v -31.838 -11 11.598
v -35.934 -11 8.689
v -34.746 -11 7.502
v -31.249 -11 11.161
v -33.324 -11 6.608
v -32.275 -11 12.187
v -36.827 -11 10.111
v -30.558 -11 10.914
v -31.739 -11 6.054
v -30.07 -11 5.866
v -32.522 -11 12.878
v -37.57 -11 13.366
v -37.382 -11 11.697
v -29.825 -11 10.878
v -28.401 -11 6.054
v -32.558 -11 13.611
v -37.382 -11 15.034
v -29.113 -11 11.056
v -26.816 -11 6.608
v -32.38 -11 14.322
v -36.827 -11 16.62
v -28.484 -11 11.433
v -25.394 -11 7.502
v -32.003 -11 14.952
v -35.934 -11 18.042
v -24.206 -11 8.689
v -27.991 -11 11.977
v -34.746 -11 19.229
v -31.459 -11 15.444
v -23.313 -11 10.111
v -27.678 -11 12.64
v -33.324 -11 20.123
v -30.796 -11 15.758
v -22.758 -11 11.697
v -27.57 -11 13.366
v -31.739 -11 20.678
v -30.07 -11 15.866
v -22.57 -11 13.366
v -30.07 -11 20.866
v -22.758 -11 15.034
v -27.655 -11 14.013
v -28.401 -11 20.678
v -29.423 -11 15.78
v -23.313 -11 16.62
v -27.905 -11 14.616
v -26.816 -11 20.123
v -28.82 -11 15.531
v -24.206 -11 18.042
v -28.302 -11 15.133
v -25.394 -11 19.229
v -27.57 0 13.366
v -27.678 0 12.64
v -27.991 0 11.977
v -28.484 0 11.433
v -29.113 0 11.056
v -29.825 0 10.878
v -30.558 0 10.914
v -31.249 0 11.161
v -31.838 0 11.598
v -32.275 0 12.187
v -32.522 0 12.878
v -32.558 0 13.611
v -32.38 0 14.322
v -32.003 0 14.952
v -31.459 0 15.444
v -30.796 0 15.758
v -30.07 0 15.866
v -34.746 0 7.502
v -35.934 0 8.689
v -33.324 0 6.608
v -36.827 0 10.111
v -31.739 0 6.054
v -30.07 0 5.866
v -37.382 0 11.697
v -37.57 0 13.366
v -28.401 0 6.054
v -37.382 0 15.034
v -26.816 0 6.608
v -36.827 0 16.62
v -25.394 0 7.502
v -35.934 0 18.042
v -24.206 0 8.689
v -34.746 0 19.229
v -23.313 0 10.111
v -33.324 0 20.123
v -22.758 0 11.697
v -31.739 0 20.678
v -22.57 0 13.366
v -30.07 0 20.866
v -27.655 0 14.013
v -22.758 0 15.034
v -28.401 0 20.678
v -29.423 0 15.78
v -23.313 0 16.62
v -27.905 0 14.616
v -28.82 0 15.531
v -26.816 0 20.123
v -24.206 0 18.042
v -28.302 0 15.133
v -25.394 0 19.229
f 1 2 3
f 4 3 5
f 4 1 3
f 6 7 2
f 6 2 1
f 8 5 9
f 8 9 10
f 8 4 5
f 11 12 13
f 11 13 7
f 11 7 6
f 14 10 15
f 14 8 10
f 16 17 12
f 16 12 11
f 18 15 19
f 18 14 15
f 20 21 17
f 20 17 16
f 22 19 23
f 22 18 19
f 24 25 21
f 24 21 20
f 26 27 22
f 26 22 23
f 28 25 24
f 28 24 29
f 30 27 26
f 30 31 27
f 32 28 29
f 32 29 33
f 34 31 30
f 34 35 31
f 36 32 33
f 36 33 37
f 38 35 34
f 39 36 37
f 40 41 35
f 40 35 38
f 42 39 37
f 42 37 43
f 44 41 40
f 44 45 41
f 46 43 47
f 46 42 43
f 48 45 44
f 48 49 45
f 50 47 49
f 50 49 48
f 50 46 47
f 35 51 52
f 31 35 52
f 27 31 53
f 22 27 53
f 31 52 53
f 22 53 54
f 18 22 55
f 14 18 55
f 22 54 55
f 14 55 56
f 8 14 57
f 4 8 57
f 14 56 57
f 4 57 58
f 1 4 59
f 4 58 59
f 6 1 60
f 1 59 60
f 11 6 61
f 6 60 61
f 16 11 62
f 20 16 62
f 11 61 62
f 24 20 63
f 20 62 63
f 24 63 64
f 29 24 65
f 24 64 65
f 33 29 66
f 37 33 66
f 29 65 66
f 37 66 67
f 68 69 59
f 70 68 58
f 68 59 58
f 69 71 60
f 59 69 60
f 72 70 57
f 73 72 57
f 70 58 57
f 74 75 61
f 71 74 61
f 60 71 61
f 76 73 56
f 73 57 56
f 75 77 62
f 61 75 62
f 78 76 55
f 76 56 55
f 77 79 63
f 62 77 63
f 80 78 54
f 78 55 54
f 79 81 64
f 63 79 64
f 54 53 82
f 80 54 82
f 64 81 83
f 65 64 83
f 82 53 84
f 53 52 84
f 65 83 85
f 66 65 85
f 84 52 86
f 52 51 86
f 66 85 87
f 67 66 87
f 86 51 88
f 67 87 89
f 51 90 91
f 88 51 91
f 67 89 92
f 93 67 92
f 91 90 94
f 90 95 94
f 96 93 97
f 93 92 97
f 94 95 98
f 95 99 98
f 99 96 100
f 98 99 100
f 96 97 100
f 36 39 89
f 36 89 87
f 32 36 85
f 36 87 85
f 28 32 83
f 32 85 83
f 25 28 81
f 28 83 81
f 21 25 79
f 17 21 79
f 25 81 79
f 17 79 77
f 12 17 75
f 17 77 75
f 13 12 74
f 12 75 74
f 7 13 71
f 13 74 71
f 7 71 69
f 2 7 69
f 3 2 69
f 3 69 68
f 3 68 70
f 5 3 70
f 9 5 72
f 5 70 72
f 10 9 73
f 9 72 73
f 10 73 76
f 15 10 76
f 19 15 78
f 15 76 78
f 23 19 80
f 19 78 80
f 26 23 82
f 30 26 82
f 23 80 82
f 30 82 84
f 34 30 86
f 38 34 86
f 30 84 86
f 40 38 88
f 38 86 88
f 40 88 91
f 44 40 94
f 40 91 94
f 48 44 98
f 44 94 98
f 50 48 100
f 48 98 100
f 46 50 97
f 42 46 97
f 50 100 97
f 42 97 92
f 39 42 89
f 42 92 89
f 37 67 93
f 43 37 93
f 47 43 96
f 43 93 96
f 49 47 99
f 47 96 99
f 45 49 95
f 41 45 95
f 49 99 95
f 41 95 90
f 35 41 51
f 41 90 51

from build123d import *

# Parameters (mm, degrees)
F1_DEPTH = 8
F2_DEPTH = 3
F4_DEPTH = 11


with BuildPart() as f1:
    # F0 (on Front) → F1 (new body)
    with BuildSketch(Plane.XZ):
        with BuildLine():
            ThreePointArc((-30.0701617141, 46.3723698281), (-35.6321374629, 46.5684078352), (-41.1665091954, 47.1555489225))
            ThreePointArc((-41.1665091954, 47.1555489225), (-30.0701617141, -22.1997679505), (-18.9738142329, 47.1555489225))
            ThreePointArc((-18.9738142329, 47.1555489225), (-24.5081859654, 46.5684078352), (-30.0701617141, 46.3723698281))
        make_face()
        with BuildLine():
            ThreePointArc((-22.5701617141, 13.3655580288), (-35.373462573, 8.0622571699), (-30.0701617141, 20.8655580288))
            ThreePointArc((-30.0701617141, 20.8655580288), (-24.7668608552, 18.6688588877), (-22.5701617141, 13.3655580288))
        make_face(mode=Mode.SUBTRACT)
    extrude(amount=F1_DEPTH)

    # F0 (on Front) → F2 (join)
    with BuildSketch(Plane.XZ):
        with BuildLine():
            ThreePointArc((-30.0701617141, 56.2795021275), (-36.9667710759, 53.357462718), (-41.1665091954, 47.1555489225))
            ThreePointArc((-41.1665091954, 47.1555489225), (-35.6321374629, 46.5684078352), (-30.0701617141, 46.3723698281))
            Line((-30.0701617141, 46.3723698281), (-30.0701617141, 50.7215580288))
            ThreePointArc((-30.0701617141, 50.7215580288), (-32.0701617141, 52.7215580288), (-30.0701617141, 54.7215580288))
            Line((-30.0701617141, 54.7215580288), (-30.0701617141, 56.2795021275))
        make_face()
        with BuildLine():
            ThreePointArc((-30.0701617141, 46.3723698281), (-24.5081859654, 46.5684078352), (-18.9738142329, 47.1555489225))
            ThreePointArc((-18.9738142329, 47.1555489225), (-23.1735523524, 53.357462718), (-30.0701617141, 56.2795021275))
            Line((-30.0701617141, 56.2795021275), (-30.0701617141, 54.7215580288))
            ThreePointArc((-30.0701617141, 54.7215580288), (-28.6559481518, 54.1357715912), (-28.0701617141, 52.7215580288))
            ThreePointArc((-28.0701617141, 52.7215580288), (-28.6559481518, 51.3073444665), (-30.0701617141, 50.7215580288))
            Line((-30.0701617141, 50.7215580288), (-30.0701617141, 46.3723698281))
        make_face()
    extrude(amount=F2_DEPTH)


with BuildPart() as f4:
    # F0 (on Front) → F4 (new body)
    with BuildSketch(Plane.XZ):
        with BuildLine():
            ThreePointArc((-22.5701617141, 13.3655580288), (-24.7668608552, 18.6688588877), (-30.0701617141, 20.8655580288))
            ThreePointArc((-30.0701617141, 20.8655580288), (-35.373462573, 8.0622571699), (-22.5701617141, 13.3655580288))
        make_face()
        with BuildLine():
            ThreePointArc((-27.5701617141, 13.3655580288), (-31.8379286671, 11.5977910759), (-30.0701617141, 15.8655580288))
            ThreePointArc((-30.0701617141, 15.8655580288), (-28.3023947612, 15.1333249818), (-27.5701617141, 13.3655580288))
        make_face(mode=Mode.SUBTRACT)
    extrude(amount=F4_DEPTH)


solid = f4.part
